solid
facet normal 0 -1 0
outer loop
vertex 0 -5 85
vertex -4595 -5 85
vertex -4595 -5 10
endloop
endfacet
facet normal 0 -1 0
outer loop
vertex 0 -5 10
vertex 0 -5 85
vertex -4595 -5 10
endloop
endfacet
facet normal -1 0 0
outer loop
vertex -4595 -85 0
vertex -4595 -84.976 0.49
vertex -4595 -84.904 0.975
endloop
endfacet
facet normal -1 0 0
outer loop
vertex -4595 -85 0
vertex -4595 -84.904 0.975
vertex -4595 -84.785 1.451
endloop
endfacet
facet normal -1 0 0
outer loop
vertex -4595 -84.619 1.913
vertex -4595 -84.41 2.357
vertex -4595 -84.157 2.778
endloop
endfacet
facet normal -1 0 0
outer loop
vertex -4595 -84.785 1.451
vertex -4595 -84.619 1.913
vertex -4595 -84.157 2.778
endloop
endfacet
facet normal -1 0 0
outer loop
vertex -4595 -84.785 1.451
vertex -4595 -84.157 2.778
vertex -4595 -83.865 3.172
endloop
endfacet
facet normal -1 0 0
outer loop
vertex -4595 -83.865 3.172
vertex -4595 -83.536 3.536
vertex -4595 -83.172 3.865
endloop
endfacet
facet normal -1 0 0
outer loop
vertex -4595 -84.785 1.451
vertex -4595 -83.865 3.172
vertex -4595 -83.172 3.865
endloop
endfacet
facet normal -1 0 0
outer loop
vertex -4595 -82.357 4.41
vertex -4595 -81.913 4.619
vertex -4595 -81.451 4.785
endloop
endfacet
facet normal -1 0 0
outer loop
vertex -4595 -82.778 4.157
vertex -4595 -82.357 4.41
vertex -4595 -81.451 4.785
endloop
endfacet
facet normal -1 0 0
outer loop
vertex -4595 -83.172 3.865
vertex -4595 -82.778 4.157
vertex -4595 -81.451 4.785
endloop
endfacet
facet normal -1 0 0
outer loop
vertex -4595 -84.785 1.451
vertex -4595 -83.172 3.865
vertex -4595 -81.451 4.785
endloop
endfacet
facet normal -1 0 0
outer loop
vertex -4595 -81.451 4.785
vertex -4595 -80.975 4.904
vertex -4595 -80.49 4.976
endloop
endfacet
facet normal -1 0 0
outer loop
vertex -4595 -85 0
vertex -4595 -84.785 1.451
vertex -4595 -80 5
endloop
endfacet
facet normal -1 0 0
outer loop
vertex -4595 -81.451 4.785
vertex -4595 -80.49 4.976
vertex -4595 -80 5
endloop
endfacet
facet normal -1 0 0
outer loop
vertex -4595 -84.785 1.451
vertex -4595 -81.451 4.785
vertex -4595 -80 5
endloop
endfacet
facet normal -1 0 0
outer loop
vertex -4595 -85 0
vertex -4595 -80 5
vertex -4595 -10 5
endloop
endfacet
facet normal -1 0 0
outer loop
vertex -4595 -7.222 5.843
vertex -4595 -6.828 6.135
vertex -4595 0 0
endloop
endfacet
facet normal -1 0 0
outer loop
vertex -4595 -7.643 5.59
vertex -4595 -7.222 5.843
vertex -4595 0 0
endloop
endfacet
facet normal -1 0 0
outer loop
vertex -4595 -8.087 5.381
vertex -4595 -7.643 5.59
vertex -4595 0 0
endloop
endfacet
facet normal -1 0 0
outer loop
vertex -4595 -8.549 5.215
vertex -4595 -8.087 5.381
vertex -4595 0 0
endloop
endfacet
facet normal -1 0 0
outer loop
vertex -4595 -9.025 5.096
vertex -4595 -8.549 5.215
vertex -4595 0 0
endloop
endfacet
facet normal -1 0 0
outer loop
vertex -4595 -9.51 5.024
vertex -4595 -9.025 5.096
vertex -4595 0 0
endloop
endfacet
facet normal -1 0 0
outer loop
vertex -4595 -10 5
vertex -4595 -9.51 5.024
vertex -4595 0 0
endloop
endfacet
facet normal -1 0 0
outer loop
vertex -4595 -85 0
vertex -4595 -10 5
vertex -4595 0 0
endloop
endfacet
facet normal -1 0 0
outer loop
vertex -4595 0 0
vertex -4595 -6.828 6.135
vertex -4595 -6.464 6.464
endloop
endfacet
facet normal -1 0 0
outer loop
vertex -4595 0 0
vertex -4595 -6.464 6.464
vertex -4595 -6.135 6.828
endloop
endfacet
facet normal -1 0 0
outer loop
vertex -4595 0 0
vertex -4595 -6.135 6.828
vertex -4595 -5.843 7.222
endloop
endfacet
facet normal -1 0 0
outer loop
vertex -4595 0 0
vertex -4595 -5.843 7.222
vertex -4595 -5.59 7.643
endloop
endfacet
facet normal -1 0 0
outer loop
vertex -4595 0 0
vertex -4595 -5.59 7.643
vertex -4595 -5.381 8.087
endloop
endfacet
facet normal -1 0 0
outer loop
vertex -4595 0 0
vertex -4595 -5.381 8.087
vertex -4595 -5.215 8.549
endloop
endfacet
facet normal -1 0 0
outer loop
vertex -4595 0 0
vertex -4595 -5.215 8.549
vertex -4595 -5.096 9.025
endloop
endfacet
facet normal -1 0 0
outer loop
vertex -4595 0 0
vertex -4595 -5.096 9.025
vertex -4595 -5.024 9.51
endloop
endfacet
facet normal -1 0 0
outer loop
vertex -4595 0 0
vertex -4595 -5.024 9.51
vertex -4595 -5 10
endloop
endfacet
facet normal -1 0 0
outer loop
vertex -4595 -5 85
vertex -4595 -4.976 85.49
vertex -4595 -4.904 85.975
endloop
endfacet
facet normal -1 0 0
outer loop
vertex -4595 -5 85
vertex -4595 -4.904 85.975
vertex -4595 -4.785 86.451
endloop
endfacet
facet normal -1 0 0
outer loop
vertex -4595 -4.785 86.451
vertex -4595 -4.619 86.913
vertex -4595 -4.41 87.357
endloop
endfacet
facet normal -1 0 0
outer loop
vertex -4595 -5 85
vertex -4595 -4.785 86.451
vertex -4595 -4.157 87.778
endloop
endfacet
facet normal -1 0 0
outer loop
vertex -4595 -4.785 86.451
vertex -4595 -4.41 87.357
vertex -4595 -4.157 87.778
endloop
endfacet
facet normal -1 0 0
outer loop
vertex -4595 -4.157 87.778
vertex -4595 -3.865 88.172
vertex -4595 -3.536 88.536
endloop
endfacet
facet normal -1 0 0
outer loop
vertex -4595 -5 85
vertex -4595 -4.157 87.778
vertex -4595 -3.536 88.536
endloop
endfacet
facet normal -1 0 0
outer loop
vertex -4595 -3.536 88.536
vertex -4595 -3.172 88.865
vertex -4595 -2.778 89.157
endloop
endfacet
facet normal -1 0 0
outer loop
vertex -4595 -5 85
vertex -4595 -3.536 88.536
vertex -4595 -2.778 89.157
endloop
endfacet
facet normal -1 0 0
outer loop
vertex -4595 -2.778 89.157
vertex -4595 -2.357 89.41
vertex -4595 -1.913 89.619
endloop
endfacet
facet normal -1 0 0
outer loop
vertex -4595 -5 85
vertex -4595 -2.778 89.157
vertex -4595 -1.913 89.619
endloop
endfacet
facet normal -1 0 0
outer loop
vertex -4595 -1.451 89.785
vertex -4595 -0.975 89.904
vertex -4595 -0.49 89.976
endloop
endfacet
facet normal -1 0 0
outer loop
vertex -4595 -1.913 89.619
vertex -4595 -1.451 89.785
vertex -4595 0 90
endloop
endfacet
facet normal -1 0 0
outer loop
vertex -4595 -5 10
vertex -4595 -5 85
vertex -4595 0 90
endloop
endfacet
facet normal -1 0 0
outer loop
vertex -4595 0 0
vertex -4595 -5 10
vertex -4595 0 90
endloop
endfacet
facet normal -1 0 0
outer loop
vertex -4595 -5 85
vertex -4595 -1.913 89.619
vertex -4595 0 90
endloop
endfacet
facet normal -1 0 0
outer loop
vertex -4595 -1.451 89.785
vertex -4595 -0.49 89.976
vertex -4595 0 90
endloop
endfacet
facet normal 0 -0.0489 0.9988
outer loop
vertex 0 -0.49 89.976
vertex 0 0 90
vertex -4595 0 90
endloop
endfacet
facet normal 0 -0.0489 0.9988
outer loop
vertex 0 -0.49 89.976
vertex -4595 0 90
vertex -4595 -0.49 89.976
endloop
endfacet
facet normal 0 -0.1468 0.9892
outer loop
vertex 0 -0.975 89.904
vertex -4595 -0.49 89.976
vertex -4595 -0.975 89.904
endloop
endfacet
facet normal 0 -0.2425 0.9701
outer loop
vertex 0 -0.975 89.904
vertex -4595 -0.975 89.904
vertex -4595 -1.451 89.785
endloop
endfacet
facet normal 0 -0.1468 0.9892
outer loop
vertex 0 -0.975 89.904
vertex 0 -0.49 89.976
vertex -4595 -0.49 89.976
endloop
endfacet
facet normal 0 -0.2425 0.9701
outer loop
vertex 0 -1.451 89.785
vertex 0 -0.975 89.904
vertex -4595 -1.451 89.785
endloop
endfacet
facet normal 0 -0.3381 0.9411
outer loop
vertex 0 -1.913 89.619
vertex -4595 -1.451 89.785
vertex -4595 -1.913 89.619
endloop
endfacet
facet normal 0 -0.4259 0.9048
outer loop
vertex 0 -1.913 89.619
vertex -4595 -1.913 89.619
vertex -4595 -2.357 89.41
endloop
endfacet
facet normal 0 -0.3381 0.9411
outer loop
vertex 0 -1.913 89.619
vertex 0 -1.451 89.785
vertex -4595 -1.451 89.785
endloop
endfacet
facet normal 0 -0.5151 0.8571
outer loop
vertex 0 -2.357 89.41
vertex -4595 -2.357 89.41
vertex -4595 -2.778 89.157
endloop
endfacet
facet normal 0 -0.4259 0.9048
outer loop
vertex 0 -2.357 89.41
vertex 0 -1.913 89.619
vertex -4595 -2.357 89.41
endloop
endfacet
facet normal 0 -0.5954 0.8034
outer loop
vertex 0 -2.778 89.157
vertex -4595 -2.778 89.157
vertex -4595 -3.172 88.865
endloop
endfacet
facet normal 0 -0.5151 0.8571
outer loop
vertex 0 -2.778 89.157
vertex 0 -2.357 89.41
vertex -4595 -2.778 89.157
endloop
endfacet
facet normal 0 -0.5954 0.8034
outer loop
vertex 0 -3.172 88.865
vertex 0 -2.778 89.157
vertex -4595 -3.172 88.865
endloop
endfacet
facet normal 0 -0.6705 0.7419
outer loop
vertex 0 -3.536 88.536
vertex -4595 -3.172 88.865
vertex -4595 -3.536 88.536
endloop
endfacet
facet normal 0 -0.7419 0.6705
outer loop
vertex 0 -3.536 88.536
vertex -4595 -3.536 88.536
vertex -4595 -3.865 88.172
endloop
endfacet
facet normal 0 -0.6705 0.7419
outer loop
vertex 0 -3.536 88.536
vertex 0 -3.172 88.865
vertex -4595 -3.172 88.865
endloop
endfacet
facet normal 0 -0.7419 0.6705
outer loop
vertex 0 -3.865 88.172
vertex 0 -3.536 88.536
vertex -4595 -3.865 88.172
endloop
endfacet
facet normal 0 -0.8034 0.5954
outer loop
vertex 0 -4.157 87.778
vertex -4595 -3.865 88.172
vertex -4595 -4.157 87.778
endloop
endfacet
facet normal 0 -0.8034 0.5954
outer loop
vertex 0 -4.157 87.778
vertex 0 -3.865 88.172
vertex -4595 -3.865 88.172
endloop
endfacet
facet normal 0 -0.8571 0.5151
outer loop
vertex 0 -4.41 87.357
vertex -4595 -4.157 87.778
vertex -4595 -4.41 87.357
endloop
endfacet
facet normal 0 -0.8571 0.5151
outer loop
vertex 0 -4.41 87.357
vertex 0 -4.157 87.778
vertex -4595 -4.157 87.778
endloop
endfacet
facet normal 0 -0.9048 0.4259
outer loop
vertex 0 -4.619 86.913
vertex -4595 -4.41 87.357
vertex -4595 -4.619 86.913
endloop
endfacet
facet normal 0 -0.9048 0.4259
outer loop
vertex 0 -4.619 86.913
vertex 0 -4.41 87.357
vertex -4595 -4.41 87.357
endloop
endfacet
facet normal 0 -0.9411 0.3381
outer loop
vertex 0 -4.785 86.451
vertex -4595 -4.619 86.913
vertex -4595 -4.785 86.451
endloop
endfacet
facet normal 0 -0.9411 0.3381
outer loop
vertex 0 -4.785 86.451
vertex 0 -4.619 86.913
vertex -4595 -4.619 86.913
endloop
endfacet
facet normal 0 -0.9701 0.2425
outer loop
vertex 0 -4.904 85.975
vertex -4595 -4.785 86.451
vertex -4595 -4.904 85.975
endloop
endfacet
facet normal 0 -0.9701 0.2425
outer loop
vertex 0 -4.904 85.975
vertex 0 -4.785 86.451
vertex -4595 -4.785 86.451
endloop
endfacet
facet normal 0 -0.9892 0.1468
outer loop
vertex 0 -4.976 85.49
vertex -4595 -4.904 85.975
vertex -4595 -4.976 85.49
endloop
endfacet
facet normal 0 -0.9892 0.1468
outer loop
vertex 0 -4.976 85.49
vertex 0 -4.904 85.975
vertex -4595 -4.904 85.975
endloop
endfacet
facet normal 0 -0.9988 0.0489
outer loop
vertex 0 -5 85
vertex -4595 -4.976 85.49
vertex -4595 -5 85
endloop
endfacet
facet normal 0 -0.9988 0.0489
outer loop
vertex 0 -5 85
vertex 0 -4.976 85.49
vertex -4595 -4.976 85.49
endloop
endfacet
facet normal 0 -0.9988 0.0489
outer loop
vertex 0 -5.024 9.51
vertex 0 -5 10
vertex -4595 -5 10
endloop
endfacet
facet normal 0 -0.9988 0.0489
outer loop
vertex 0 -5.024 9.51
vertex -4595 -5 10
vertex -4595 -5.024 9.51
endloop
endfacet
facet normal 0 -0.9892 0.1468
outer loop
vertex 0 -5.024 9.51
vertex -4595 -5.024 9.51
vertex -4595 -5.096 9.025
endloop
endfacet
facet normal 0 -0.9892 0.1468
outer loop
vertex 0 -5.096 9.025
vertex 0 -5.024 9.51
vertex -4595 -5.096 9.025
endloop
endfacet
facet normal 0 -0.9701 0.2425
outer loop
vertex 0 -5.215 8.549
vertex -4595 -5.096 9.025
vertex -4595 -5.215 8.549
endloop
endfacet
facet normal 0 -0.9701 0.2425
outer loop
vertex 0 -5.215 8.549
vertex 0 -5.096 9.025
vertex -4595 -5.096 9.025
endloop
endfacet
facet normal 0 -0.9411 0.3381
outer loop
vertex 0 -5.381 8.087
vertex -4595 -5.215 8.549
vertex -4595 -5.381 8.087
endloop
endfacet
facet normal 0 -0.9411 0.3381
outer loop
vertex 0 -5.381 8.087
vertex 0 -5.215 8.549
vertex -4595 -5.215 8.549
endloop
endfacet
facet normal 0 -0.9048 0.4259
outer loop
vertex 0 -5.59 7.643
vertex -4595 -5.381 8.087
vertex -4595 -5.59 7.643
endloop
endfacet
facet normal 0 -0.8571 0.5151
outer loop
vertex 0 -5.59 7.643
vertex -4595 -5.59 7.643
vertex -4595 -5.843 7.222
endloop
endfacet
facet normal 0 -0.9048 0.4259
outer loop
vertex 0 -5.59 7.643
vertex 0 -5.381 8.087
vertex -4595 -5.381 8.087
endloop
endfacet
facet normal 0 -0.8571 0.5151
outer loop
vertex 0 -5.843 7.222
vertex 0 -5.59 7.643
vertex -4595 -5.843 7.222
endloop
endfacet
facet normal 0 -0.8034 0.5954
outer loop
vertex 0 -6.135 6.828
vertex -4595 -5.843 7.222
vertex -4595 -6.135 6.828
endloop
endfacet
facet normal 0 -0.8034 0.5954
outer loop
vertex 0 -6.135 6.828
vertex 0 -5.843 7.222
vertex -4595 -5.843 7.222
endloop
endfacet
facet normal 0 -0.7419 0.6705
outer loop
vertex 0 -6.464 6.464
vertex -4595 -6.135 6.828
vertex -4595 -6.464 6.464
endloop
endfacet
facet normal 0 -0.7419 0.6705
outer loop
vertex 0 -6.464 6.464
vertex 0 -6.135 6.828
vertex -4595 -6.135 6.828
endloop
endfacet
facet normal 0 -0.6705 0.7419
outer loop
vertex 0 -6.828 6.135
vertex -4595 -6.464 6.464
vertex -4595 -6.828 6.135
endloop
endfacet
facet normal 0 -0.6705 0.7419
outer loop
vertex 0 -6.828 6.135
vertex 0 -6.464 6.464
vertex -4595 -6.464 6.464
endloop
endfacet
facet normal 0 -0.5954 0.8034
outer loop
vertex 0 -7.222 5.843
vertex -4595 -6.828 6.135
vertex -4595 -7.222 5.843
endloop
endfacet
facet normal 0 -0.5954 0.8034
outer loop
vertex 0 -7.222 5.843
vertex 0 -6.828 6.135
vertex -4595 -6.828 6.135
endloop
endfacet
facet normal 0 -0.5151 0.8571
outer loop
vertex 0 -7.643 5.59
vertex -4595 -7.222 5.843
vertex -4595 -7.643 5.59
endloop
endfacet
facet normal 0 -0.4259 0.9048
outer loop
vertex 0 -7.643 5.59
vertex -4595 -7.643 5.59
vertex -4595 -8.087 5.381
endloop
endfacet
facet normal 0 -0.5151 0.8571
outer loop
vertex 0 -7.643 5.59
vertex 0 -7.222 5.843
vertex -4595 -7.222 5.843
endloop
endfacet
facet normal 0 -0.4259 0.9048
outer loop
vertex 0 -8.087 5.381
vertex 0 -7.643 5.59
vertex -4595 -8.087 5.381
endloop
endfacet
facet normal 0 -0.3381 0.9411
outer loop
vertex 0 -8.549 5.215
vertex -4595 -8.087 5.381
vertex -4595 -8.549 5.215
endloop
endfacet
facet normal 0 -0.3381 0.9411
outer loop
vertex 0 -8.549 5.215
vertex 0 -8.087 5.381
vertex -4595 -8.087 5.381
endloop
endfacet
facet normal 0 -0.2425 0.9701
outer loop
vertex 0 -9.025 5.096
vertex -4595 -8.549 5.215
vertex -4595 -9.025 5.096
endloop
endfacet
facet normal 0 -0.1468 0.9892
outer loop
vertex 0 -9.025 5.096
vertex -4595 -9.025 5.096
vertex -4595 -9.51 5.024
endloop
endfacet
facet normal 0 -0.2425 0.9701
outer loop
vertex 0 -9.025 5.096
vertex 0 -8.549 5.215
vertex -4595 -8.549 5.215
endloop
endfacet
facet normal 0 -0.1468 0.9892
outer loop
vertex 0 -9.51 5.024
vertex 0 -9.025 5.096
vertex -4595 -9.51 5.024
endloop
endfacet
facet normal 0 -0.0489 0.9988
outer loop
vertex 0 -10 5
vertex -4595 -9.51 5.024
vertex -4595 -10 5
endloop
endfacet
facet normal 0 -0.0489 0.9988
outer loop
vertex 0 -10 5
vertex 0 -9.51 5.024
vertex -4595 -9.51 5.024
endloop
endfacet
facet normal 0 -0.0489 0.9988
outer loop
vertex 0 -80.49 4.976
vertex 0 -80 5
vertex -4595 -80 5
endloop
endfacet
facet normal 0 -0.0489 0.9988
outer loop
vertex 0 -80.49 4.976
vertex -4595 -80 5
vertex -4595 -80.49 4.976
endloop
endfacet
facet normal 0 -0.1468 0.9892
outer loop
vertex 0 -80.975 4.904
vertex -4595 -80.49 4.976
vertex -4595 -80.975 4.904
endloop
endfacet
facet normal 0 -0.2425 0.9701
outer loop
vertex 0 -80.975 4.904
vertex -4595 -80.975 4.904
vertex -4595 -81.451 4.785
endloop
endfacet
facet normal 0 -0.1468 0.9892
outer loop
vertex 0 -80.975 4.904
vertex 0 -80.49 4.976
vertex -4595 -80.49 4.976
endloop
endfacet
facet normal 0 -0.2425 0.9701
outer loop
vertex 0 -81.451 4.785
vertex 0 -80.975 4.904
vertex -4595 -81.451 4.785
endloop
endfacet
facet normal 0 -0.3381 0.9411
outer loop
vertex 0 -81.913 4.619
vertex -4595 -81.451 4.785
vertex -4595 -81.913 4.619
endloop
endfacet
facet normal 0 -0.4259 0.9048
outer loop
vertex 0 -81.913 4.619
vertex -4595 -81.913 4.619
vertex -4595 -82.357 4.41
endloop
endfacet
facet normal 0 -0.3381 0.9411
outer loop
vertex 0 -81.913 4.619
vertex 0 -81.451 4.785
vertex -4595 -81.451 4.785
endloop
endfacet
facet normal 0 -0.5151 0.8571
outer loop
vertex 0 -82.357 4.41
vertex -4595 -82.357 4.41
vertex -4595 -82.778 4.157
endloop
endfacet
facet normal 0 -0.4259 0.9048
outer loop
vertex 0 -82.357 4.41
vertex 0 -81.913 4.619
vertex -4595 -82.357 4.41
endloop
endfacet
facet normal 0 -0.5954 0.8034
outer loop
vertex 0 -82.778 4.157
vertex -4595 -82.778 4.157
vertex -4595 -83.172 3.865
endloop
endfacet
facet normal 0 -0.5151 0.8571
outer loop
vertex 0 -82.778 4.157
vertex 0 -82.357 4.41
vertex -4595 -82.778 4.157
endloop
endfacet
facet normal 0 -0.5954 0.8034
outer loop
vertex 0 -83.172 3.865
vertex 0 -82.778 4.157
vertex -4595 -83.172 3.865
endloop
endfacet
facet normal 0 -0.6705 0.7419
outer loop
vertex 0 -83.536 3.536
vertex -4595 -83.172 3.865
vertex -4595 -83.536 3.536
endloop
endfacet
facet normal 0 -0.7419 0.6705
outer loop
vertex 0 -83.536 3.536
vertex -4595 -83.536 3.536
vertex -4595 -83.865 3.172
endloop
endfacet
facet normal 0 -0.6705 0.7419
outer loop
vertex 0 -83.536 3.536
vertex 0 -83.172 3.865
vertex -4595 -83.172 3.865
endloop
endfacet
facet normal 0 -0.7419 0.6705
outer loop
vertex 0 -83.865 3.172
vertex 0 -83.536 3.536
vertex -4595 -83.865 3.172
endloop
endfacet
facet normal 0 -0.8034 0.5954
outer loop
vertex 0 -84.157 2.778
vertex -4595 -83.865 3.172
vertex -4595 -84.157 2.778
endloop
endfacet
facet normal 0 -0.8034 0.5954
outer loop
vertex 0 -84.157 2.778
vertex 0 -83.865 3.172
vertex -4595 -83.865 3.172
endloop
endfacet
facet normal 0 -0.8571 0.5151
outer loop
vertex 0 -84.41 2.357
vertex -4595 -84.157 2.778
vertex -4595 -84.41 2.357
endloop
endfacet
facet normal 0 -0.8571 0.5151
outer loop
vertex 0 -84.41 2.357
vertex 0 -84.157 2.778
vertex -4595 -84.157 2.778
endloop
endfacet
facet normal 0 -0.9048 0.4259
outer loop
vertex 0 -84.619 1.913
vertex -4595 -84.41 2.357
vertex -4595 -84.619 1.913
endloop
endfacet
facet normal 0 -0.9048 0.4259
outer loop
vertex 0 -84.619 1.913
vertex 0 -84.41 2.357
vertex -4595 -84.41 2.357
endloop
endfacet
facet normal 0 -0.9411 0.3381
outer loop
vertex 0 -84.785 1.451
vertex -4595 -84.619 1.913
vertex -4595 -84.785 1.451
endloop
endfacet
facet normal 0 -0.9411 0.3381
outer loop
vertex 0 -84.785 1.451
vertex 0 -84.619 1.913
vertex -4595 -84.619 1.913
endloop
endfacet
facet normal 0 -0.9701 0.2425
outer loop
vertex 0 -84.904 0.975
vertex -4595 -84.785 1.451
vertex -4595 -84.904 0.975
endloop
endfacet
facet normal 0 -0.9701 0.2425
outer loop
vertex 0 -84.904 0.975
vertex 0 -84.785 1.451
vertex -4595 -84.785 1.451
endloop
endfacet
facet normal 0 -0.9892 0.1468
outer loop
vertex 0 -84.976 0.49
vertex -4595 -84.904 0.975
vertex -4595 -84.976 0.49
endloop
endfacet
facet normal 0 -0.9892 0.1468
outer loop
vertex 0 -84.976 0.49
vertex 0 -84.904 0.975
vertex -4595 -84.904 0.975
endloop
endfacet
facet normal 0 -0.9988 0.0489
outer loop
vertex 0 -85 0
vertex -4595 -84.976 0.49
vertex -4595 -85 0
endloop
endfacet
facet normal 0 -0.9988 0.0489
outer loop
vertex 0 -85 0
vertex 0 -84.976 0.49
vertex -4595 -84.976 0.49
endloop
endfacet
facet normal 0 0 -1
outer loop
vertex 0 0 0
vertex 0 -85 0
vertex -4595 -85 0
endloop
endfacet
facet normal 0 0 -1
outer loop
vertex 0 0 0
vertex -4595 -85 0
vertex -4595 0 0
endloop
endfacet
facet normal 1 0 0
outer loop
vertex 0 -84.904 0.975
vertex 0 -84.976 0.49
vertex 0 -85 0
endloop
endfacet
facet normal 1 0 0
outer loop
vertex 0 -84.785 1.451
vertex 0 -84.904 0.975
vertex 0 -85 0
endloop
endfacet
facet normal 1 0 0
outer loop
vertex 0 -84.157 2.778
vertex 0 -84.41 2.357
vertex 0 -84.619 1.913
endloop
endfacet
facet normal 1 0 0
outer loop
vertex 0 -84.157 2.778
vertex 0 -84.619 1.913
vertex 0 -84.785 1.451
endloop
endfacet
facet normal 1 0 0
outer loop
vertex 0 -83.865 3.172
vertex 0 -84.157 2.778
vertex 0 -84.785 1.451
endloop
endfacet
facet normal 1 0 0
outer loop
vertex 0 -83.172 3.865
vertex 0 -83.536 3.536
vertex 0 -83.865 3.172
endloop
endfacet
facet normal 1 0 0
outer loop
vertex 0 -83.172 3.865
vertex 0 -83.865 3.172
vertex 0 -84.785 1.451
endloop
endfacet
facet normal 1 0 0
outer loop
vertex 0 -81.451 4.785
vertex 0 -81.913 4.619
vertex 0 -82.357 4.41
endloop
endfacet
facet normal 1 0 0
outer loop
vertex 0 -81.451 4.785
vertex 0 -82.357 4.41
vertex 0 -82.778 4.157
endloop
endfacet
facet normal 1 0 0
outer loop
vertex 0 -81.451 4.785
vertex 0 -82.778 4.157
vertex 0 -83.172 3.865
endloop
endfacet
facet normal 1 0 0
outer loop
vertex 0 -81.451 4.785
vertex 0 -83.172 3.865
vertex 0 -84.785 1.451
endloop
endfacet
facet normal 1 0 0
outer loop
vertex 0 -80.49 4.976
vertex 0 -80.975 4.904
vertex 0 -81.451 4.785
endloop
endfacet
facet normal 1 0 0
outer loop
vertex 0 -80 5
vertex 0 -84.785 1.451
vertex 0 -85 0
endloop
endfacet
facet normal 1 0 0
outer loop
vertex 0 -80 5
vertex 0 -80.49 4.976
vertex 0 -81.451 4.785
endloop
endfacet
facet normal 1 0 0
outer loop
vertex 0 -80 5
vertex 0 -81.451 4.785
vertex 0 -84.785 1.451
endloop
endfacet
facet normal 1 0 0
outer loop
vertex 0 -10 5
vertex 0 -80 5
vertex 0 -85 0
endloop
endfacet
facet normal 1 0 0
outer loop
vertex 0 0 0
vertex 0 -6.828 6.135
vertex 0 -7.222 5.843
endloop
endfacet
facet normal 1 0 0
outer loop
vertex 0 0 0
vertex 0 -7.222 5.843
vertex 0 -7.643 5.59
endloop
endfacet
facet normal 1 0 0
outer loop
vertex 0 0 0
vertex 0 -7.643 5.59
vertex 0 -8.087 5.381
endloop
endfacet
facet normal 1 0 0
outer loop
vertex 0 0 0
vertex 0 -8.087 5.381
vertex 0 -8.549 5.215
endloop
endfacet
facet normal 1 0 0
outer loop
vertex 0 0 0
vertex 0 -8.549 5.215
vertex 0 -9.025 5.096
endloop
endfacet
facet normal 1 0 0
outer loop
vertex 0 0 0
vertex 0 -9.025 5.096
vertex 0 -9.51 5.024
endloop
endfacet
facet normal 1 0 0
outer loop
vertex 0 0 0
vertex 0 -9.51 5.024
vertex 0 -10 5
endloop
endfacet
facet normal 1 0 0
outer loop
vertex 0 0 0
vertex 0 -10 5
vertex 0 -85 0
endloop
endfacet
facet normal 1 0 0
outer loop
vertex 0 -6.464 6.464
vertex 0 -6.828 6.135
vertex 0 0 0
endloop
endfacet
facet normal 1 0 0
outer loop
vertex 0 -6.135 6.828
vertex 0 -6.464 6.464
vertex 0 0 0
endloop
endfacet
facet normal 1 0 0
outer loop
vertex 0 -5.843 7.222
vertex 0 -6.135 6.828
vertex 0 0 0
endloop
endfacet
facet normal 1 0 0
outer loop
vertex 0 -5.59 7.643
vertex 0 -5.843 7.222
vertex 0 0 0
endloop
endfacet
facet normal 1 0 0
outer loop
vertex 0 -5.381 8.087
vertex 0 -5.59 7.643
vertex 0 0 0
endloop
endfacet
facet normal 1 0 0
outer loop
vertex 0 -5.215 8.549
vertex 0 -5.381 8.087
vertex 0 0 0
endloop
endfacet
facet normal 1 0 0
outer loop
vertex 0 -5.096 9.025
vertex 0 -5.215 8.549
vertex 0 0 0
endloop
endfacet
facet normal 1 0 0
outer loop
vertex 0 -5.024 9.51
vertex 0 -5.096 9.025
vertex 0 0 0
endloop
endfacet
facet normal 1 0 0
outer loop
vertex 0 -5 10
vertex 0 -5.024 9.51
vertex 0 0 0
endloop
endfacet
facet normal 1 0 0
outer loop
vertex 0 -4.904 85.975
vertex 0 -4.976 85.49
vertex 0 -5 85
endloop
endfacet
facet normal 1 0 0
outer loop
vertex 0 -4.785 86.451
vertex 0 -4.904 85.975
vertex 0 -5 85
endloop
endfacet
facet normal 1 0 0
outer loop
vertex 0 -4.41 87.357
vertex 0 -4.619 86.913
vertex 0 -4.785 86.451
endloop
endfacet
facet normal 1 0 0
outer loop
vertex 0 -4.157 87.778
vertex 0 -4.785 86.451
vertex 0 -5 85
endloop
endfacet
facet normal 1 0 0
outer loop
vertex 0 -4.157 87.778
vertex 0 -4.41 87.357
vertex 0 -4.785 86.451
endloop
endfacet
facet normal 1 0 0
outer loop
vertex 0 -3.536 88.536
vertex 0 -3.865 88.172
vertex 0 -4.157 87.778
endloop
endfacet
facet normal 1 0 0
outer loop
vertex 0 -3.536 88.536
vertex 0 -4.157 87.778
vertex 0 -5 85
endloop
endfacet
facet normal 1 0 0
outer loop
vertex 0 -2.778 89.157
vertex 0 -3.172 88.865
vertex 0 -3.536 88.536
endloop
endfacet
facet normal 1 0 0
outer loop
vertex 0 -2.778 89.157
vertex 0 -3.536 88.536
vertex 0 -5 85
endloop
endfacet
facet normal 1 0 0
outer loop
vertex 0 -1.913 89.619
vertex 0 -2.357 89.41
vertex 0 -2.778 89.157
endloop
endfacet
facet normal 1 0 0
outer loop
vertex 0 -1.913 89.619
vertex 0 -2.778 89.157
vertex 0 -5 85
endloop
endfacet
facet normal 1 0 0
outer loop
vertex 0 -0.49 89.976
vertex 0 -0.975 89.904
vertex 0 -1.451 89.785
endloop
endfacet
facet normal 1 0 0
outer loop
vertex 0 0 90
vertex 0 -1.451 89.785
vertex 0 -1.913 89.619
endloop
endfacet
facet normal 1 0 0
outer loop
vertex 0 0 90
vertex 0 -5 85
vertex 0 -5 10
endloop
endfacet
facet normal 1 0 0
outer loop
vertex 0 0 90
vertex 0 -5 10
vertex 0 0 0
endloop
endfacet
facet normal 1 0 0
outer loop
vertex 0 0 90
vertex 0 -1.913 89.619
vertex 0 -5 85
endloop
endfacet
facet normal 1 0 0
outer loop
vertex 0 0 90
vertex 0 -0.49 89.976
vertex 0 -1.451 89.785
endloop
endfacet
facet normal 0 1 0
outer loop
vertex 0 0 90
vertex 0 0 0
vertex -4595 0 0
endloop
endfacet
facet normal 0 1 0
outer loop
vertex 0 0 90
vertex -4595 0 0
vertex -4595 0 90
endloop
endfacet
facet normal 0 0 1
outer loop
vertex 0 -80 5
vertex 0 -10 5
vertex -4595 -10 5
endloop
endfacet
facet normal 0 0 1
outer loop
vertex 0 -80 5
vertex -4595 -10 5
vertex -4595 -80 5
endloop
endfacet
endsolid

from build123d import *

# Parameters (mm, degrees)
ANGLE_IRON_35_X_35_X_5_2_DEPTH = 4595


with BuildPart() as part:
    # Sketch13 → Angle iron 35 X 35 X 5(2) (new body)
    with BuildSketch(Plane(origin=(0, 0, 0), x_dir=(0, -1, 0), z_dir=(-1, 0, 0))):
        with BuildLine():
            Line((0, 0), (0, 90))
            ThreePointArc((0, 90), (3.535533906, 88.535533906), (5, 85))
            Line((5, 85), (5, 10))
            ThreePointArc((5, 10), (6.464466094, 6.464466094), (10, 5))
            Line((10, 5), (80, 5))
            ThreePointArc((80, 5), (83.535533906, 3.535533906), (85, 0))
            Line((85, 0), (0, 0))
        make_face()
    extrude(amount=ANGLE_IRON_35_X_35_X_5_2_DEPTH)


solid = part.part
